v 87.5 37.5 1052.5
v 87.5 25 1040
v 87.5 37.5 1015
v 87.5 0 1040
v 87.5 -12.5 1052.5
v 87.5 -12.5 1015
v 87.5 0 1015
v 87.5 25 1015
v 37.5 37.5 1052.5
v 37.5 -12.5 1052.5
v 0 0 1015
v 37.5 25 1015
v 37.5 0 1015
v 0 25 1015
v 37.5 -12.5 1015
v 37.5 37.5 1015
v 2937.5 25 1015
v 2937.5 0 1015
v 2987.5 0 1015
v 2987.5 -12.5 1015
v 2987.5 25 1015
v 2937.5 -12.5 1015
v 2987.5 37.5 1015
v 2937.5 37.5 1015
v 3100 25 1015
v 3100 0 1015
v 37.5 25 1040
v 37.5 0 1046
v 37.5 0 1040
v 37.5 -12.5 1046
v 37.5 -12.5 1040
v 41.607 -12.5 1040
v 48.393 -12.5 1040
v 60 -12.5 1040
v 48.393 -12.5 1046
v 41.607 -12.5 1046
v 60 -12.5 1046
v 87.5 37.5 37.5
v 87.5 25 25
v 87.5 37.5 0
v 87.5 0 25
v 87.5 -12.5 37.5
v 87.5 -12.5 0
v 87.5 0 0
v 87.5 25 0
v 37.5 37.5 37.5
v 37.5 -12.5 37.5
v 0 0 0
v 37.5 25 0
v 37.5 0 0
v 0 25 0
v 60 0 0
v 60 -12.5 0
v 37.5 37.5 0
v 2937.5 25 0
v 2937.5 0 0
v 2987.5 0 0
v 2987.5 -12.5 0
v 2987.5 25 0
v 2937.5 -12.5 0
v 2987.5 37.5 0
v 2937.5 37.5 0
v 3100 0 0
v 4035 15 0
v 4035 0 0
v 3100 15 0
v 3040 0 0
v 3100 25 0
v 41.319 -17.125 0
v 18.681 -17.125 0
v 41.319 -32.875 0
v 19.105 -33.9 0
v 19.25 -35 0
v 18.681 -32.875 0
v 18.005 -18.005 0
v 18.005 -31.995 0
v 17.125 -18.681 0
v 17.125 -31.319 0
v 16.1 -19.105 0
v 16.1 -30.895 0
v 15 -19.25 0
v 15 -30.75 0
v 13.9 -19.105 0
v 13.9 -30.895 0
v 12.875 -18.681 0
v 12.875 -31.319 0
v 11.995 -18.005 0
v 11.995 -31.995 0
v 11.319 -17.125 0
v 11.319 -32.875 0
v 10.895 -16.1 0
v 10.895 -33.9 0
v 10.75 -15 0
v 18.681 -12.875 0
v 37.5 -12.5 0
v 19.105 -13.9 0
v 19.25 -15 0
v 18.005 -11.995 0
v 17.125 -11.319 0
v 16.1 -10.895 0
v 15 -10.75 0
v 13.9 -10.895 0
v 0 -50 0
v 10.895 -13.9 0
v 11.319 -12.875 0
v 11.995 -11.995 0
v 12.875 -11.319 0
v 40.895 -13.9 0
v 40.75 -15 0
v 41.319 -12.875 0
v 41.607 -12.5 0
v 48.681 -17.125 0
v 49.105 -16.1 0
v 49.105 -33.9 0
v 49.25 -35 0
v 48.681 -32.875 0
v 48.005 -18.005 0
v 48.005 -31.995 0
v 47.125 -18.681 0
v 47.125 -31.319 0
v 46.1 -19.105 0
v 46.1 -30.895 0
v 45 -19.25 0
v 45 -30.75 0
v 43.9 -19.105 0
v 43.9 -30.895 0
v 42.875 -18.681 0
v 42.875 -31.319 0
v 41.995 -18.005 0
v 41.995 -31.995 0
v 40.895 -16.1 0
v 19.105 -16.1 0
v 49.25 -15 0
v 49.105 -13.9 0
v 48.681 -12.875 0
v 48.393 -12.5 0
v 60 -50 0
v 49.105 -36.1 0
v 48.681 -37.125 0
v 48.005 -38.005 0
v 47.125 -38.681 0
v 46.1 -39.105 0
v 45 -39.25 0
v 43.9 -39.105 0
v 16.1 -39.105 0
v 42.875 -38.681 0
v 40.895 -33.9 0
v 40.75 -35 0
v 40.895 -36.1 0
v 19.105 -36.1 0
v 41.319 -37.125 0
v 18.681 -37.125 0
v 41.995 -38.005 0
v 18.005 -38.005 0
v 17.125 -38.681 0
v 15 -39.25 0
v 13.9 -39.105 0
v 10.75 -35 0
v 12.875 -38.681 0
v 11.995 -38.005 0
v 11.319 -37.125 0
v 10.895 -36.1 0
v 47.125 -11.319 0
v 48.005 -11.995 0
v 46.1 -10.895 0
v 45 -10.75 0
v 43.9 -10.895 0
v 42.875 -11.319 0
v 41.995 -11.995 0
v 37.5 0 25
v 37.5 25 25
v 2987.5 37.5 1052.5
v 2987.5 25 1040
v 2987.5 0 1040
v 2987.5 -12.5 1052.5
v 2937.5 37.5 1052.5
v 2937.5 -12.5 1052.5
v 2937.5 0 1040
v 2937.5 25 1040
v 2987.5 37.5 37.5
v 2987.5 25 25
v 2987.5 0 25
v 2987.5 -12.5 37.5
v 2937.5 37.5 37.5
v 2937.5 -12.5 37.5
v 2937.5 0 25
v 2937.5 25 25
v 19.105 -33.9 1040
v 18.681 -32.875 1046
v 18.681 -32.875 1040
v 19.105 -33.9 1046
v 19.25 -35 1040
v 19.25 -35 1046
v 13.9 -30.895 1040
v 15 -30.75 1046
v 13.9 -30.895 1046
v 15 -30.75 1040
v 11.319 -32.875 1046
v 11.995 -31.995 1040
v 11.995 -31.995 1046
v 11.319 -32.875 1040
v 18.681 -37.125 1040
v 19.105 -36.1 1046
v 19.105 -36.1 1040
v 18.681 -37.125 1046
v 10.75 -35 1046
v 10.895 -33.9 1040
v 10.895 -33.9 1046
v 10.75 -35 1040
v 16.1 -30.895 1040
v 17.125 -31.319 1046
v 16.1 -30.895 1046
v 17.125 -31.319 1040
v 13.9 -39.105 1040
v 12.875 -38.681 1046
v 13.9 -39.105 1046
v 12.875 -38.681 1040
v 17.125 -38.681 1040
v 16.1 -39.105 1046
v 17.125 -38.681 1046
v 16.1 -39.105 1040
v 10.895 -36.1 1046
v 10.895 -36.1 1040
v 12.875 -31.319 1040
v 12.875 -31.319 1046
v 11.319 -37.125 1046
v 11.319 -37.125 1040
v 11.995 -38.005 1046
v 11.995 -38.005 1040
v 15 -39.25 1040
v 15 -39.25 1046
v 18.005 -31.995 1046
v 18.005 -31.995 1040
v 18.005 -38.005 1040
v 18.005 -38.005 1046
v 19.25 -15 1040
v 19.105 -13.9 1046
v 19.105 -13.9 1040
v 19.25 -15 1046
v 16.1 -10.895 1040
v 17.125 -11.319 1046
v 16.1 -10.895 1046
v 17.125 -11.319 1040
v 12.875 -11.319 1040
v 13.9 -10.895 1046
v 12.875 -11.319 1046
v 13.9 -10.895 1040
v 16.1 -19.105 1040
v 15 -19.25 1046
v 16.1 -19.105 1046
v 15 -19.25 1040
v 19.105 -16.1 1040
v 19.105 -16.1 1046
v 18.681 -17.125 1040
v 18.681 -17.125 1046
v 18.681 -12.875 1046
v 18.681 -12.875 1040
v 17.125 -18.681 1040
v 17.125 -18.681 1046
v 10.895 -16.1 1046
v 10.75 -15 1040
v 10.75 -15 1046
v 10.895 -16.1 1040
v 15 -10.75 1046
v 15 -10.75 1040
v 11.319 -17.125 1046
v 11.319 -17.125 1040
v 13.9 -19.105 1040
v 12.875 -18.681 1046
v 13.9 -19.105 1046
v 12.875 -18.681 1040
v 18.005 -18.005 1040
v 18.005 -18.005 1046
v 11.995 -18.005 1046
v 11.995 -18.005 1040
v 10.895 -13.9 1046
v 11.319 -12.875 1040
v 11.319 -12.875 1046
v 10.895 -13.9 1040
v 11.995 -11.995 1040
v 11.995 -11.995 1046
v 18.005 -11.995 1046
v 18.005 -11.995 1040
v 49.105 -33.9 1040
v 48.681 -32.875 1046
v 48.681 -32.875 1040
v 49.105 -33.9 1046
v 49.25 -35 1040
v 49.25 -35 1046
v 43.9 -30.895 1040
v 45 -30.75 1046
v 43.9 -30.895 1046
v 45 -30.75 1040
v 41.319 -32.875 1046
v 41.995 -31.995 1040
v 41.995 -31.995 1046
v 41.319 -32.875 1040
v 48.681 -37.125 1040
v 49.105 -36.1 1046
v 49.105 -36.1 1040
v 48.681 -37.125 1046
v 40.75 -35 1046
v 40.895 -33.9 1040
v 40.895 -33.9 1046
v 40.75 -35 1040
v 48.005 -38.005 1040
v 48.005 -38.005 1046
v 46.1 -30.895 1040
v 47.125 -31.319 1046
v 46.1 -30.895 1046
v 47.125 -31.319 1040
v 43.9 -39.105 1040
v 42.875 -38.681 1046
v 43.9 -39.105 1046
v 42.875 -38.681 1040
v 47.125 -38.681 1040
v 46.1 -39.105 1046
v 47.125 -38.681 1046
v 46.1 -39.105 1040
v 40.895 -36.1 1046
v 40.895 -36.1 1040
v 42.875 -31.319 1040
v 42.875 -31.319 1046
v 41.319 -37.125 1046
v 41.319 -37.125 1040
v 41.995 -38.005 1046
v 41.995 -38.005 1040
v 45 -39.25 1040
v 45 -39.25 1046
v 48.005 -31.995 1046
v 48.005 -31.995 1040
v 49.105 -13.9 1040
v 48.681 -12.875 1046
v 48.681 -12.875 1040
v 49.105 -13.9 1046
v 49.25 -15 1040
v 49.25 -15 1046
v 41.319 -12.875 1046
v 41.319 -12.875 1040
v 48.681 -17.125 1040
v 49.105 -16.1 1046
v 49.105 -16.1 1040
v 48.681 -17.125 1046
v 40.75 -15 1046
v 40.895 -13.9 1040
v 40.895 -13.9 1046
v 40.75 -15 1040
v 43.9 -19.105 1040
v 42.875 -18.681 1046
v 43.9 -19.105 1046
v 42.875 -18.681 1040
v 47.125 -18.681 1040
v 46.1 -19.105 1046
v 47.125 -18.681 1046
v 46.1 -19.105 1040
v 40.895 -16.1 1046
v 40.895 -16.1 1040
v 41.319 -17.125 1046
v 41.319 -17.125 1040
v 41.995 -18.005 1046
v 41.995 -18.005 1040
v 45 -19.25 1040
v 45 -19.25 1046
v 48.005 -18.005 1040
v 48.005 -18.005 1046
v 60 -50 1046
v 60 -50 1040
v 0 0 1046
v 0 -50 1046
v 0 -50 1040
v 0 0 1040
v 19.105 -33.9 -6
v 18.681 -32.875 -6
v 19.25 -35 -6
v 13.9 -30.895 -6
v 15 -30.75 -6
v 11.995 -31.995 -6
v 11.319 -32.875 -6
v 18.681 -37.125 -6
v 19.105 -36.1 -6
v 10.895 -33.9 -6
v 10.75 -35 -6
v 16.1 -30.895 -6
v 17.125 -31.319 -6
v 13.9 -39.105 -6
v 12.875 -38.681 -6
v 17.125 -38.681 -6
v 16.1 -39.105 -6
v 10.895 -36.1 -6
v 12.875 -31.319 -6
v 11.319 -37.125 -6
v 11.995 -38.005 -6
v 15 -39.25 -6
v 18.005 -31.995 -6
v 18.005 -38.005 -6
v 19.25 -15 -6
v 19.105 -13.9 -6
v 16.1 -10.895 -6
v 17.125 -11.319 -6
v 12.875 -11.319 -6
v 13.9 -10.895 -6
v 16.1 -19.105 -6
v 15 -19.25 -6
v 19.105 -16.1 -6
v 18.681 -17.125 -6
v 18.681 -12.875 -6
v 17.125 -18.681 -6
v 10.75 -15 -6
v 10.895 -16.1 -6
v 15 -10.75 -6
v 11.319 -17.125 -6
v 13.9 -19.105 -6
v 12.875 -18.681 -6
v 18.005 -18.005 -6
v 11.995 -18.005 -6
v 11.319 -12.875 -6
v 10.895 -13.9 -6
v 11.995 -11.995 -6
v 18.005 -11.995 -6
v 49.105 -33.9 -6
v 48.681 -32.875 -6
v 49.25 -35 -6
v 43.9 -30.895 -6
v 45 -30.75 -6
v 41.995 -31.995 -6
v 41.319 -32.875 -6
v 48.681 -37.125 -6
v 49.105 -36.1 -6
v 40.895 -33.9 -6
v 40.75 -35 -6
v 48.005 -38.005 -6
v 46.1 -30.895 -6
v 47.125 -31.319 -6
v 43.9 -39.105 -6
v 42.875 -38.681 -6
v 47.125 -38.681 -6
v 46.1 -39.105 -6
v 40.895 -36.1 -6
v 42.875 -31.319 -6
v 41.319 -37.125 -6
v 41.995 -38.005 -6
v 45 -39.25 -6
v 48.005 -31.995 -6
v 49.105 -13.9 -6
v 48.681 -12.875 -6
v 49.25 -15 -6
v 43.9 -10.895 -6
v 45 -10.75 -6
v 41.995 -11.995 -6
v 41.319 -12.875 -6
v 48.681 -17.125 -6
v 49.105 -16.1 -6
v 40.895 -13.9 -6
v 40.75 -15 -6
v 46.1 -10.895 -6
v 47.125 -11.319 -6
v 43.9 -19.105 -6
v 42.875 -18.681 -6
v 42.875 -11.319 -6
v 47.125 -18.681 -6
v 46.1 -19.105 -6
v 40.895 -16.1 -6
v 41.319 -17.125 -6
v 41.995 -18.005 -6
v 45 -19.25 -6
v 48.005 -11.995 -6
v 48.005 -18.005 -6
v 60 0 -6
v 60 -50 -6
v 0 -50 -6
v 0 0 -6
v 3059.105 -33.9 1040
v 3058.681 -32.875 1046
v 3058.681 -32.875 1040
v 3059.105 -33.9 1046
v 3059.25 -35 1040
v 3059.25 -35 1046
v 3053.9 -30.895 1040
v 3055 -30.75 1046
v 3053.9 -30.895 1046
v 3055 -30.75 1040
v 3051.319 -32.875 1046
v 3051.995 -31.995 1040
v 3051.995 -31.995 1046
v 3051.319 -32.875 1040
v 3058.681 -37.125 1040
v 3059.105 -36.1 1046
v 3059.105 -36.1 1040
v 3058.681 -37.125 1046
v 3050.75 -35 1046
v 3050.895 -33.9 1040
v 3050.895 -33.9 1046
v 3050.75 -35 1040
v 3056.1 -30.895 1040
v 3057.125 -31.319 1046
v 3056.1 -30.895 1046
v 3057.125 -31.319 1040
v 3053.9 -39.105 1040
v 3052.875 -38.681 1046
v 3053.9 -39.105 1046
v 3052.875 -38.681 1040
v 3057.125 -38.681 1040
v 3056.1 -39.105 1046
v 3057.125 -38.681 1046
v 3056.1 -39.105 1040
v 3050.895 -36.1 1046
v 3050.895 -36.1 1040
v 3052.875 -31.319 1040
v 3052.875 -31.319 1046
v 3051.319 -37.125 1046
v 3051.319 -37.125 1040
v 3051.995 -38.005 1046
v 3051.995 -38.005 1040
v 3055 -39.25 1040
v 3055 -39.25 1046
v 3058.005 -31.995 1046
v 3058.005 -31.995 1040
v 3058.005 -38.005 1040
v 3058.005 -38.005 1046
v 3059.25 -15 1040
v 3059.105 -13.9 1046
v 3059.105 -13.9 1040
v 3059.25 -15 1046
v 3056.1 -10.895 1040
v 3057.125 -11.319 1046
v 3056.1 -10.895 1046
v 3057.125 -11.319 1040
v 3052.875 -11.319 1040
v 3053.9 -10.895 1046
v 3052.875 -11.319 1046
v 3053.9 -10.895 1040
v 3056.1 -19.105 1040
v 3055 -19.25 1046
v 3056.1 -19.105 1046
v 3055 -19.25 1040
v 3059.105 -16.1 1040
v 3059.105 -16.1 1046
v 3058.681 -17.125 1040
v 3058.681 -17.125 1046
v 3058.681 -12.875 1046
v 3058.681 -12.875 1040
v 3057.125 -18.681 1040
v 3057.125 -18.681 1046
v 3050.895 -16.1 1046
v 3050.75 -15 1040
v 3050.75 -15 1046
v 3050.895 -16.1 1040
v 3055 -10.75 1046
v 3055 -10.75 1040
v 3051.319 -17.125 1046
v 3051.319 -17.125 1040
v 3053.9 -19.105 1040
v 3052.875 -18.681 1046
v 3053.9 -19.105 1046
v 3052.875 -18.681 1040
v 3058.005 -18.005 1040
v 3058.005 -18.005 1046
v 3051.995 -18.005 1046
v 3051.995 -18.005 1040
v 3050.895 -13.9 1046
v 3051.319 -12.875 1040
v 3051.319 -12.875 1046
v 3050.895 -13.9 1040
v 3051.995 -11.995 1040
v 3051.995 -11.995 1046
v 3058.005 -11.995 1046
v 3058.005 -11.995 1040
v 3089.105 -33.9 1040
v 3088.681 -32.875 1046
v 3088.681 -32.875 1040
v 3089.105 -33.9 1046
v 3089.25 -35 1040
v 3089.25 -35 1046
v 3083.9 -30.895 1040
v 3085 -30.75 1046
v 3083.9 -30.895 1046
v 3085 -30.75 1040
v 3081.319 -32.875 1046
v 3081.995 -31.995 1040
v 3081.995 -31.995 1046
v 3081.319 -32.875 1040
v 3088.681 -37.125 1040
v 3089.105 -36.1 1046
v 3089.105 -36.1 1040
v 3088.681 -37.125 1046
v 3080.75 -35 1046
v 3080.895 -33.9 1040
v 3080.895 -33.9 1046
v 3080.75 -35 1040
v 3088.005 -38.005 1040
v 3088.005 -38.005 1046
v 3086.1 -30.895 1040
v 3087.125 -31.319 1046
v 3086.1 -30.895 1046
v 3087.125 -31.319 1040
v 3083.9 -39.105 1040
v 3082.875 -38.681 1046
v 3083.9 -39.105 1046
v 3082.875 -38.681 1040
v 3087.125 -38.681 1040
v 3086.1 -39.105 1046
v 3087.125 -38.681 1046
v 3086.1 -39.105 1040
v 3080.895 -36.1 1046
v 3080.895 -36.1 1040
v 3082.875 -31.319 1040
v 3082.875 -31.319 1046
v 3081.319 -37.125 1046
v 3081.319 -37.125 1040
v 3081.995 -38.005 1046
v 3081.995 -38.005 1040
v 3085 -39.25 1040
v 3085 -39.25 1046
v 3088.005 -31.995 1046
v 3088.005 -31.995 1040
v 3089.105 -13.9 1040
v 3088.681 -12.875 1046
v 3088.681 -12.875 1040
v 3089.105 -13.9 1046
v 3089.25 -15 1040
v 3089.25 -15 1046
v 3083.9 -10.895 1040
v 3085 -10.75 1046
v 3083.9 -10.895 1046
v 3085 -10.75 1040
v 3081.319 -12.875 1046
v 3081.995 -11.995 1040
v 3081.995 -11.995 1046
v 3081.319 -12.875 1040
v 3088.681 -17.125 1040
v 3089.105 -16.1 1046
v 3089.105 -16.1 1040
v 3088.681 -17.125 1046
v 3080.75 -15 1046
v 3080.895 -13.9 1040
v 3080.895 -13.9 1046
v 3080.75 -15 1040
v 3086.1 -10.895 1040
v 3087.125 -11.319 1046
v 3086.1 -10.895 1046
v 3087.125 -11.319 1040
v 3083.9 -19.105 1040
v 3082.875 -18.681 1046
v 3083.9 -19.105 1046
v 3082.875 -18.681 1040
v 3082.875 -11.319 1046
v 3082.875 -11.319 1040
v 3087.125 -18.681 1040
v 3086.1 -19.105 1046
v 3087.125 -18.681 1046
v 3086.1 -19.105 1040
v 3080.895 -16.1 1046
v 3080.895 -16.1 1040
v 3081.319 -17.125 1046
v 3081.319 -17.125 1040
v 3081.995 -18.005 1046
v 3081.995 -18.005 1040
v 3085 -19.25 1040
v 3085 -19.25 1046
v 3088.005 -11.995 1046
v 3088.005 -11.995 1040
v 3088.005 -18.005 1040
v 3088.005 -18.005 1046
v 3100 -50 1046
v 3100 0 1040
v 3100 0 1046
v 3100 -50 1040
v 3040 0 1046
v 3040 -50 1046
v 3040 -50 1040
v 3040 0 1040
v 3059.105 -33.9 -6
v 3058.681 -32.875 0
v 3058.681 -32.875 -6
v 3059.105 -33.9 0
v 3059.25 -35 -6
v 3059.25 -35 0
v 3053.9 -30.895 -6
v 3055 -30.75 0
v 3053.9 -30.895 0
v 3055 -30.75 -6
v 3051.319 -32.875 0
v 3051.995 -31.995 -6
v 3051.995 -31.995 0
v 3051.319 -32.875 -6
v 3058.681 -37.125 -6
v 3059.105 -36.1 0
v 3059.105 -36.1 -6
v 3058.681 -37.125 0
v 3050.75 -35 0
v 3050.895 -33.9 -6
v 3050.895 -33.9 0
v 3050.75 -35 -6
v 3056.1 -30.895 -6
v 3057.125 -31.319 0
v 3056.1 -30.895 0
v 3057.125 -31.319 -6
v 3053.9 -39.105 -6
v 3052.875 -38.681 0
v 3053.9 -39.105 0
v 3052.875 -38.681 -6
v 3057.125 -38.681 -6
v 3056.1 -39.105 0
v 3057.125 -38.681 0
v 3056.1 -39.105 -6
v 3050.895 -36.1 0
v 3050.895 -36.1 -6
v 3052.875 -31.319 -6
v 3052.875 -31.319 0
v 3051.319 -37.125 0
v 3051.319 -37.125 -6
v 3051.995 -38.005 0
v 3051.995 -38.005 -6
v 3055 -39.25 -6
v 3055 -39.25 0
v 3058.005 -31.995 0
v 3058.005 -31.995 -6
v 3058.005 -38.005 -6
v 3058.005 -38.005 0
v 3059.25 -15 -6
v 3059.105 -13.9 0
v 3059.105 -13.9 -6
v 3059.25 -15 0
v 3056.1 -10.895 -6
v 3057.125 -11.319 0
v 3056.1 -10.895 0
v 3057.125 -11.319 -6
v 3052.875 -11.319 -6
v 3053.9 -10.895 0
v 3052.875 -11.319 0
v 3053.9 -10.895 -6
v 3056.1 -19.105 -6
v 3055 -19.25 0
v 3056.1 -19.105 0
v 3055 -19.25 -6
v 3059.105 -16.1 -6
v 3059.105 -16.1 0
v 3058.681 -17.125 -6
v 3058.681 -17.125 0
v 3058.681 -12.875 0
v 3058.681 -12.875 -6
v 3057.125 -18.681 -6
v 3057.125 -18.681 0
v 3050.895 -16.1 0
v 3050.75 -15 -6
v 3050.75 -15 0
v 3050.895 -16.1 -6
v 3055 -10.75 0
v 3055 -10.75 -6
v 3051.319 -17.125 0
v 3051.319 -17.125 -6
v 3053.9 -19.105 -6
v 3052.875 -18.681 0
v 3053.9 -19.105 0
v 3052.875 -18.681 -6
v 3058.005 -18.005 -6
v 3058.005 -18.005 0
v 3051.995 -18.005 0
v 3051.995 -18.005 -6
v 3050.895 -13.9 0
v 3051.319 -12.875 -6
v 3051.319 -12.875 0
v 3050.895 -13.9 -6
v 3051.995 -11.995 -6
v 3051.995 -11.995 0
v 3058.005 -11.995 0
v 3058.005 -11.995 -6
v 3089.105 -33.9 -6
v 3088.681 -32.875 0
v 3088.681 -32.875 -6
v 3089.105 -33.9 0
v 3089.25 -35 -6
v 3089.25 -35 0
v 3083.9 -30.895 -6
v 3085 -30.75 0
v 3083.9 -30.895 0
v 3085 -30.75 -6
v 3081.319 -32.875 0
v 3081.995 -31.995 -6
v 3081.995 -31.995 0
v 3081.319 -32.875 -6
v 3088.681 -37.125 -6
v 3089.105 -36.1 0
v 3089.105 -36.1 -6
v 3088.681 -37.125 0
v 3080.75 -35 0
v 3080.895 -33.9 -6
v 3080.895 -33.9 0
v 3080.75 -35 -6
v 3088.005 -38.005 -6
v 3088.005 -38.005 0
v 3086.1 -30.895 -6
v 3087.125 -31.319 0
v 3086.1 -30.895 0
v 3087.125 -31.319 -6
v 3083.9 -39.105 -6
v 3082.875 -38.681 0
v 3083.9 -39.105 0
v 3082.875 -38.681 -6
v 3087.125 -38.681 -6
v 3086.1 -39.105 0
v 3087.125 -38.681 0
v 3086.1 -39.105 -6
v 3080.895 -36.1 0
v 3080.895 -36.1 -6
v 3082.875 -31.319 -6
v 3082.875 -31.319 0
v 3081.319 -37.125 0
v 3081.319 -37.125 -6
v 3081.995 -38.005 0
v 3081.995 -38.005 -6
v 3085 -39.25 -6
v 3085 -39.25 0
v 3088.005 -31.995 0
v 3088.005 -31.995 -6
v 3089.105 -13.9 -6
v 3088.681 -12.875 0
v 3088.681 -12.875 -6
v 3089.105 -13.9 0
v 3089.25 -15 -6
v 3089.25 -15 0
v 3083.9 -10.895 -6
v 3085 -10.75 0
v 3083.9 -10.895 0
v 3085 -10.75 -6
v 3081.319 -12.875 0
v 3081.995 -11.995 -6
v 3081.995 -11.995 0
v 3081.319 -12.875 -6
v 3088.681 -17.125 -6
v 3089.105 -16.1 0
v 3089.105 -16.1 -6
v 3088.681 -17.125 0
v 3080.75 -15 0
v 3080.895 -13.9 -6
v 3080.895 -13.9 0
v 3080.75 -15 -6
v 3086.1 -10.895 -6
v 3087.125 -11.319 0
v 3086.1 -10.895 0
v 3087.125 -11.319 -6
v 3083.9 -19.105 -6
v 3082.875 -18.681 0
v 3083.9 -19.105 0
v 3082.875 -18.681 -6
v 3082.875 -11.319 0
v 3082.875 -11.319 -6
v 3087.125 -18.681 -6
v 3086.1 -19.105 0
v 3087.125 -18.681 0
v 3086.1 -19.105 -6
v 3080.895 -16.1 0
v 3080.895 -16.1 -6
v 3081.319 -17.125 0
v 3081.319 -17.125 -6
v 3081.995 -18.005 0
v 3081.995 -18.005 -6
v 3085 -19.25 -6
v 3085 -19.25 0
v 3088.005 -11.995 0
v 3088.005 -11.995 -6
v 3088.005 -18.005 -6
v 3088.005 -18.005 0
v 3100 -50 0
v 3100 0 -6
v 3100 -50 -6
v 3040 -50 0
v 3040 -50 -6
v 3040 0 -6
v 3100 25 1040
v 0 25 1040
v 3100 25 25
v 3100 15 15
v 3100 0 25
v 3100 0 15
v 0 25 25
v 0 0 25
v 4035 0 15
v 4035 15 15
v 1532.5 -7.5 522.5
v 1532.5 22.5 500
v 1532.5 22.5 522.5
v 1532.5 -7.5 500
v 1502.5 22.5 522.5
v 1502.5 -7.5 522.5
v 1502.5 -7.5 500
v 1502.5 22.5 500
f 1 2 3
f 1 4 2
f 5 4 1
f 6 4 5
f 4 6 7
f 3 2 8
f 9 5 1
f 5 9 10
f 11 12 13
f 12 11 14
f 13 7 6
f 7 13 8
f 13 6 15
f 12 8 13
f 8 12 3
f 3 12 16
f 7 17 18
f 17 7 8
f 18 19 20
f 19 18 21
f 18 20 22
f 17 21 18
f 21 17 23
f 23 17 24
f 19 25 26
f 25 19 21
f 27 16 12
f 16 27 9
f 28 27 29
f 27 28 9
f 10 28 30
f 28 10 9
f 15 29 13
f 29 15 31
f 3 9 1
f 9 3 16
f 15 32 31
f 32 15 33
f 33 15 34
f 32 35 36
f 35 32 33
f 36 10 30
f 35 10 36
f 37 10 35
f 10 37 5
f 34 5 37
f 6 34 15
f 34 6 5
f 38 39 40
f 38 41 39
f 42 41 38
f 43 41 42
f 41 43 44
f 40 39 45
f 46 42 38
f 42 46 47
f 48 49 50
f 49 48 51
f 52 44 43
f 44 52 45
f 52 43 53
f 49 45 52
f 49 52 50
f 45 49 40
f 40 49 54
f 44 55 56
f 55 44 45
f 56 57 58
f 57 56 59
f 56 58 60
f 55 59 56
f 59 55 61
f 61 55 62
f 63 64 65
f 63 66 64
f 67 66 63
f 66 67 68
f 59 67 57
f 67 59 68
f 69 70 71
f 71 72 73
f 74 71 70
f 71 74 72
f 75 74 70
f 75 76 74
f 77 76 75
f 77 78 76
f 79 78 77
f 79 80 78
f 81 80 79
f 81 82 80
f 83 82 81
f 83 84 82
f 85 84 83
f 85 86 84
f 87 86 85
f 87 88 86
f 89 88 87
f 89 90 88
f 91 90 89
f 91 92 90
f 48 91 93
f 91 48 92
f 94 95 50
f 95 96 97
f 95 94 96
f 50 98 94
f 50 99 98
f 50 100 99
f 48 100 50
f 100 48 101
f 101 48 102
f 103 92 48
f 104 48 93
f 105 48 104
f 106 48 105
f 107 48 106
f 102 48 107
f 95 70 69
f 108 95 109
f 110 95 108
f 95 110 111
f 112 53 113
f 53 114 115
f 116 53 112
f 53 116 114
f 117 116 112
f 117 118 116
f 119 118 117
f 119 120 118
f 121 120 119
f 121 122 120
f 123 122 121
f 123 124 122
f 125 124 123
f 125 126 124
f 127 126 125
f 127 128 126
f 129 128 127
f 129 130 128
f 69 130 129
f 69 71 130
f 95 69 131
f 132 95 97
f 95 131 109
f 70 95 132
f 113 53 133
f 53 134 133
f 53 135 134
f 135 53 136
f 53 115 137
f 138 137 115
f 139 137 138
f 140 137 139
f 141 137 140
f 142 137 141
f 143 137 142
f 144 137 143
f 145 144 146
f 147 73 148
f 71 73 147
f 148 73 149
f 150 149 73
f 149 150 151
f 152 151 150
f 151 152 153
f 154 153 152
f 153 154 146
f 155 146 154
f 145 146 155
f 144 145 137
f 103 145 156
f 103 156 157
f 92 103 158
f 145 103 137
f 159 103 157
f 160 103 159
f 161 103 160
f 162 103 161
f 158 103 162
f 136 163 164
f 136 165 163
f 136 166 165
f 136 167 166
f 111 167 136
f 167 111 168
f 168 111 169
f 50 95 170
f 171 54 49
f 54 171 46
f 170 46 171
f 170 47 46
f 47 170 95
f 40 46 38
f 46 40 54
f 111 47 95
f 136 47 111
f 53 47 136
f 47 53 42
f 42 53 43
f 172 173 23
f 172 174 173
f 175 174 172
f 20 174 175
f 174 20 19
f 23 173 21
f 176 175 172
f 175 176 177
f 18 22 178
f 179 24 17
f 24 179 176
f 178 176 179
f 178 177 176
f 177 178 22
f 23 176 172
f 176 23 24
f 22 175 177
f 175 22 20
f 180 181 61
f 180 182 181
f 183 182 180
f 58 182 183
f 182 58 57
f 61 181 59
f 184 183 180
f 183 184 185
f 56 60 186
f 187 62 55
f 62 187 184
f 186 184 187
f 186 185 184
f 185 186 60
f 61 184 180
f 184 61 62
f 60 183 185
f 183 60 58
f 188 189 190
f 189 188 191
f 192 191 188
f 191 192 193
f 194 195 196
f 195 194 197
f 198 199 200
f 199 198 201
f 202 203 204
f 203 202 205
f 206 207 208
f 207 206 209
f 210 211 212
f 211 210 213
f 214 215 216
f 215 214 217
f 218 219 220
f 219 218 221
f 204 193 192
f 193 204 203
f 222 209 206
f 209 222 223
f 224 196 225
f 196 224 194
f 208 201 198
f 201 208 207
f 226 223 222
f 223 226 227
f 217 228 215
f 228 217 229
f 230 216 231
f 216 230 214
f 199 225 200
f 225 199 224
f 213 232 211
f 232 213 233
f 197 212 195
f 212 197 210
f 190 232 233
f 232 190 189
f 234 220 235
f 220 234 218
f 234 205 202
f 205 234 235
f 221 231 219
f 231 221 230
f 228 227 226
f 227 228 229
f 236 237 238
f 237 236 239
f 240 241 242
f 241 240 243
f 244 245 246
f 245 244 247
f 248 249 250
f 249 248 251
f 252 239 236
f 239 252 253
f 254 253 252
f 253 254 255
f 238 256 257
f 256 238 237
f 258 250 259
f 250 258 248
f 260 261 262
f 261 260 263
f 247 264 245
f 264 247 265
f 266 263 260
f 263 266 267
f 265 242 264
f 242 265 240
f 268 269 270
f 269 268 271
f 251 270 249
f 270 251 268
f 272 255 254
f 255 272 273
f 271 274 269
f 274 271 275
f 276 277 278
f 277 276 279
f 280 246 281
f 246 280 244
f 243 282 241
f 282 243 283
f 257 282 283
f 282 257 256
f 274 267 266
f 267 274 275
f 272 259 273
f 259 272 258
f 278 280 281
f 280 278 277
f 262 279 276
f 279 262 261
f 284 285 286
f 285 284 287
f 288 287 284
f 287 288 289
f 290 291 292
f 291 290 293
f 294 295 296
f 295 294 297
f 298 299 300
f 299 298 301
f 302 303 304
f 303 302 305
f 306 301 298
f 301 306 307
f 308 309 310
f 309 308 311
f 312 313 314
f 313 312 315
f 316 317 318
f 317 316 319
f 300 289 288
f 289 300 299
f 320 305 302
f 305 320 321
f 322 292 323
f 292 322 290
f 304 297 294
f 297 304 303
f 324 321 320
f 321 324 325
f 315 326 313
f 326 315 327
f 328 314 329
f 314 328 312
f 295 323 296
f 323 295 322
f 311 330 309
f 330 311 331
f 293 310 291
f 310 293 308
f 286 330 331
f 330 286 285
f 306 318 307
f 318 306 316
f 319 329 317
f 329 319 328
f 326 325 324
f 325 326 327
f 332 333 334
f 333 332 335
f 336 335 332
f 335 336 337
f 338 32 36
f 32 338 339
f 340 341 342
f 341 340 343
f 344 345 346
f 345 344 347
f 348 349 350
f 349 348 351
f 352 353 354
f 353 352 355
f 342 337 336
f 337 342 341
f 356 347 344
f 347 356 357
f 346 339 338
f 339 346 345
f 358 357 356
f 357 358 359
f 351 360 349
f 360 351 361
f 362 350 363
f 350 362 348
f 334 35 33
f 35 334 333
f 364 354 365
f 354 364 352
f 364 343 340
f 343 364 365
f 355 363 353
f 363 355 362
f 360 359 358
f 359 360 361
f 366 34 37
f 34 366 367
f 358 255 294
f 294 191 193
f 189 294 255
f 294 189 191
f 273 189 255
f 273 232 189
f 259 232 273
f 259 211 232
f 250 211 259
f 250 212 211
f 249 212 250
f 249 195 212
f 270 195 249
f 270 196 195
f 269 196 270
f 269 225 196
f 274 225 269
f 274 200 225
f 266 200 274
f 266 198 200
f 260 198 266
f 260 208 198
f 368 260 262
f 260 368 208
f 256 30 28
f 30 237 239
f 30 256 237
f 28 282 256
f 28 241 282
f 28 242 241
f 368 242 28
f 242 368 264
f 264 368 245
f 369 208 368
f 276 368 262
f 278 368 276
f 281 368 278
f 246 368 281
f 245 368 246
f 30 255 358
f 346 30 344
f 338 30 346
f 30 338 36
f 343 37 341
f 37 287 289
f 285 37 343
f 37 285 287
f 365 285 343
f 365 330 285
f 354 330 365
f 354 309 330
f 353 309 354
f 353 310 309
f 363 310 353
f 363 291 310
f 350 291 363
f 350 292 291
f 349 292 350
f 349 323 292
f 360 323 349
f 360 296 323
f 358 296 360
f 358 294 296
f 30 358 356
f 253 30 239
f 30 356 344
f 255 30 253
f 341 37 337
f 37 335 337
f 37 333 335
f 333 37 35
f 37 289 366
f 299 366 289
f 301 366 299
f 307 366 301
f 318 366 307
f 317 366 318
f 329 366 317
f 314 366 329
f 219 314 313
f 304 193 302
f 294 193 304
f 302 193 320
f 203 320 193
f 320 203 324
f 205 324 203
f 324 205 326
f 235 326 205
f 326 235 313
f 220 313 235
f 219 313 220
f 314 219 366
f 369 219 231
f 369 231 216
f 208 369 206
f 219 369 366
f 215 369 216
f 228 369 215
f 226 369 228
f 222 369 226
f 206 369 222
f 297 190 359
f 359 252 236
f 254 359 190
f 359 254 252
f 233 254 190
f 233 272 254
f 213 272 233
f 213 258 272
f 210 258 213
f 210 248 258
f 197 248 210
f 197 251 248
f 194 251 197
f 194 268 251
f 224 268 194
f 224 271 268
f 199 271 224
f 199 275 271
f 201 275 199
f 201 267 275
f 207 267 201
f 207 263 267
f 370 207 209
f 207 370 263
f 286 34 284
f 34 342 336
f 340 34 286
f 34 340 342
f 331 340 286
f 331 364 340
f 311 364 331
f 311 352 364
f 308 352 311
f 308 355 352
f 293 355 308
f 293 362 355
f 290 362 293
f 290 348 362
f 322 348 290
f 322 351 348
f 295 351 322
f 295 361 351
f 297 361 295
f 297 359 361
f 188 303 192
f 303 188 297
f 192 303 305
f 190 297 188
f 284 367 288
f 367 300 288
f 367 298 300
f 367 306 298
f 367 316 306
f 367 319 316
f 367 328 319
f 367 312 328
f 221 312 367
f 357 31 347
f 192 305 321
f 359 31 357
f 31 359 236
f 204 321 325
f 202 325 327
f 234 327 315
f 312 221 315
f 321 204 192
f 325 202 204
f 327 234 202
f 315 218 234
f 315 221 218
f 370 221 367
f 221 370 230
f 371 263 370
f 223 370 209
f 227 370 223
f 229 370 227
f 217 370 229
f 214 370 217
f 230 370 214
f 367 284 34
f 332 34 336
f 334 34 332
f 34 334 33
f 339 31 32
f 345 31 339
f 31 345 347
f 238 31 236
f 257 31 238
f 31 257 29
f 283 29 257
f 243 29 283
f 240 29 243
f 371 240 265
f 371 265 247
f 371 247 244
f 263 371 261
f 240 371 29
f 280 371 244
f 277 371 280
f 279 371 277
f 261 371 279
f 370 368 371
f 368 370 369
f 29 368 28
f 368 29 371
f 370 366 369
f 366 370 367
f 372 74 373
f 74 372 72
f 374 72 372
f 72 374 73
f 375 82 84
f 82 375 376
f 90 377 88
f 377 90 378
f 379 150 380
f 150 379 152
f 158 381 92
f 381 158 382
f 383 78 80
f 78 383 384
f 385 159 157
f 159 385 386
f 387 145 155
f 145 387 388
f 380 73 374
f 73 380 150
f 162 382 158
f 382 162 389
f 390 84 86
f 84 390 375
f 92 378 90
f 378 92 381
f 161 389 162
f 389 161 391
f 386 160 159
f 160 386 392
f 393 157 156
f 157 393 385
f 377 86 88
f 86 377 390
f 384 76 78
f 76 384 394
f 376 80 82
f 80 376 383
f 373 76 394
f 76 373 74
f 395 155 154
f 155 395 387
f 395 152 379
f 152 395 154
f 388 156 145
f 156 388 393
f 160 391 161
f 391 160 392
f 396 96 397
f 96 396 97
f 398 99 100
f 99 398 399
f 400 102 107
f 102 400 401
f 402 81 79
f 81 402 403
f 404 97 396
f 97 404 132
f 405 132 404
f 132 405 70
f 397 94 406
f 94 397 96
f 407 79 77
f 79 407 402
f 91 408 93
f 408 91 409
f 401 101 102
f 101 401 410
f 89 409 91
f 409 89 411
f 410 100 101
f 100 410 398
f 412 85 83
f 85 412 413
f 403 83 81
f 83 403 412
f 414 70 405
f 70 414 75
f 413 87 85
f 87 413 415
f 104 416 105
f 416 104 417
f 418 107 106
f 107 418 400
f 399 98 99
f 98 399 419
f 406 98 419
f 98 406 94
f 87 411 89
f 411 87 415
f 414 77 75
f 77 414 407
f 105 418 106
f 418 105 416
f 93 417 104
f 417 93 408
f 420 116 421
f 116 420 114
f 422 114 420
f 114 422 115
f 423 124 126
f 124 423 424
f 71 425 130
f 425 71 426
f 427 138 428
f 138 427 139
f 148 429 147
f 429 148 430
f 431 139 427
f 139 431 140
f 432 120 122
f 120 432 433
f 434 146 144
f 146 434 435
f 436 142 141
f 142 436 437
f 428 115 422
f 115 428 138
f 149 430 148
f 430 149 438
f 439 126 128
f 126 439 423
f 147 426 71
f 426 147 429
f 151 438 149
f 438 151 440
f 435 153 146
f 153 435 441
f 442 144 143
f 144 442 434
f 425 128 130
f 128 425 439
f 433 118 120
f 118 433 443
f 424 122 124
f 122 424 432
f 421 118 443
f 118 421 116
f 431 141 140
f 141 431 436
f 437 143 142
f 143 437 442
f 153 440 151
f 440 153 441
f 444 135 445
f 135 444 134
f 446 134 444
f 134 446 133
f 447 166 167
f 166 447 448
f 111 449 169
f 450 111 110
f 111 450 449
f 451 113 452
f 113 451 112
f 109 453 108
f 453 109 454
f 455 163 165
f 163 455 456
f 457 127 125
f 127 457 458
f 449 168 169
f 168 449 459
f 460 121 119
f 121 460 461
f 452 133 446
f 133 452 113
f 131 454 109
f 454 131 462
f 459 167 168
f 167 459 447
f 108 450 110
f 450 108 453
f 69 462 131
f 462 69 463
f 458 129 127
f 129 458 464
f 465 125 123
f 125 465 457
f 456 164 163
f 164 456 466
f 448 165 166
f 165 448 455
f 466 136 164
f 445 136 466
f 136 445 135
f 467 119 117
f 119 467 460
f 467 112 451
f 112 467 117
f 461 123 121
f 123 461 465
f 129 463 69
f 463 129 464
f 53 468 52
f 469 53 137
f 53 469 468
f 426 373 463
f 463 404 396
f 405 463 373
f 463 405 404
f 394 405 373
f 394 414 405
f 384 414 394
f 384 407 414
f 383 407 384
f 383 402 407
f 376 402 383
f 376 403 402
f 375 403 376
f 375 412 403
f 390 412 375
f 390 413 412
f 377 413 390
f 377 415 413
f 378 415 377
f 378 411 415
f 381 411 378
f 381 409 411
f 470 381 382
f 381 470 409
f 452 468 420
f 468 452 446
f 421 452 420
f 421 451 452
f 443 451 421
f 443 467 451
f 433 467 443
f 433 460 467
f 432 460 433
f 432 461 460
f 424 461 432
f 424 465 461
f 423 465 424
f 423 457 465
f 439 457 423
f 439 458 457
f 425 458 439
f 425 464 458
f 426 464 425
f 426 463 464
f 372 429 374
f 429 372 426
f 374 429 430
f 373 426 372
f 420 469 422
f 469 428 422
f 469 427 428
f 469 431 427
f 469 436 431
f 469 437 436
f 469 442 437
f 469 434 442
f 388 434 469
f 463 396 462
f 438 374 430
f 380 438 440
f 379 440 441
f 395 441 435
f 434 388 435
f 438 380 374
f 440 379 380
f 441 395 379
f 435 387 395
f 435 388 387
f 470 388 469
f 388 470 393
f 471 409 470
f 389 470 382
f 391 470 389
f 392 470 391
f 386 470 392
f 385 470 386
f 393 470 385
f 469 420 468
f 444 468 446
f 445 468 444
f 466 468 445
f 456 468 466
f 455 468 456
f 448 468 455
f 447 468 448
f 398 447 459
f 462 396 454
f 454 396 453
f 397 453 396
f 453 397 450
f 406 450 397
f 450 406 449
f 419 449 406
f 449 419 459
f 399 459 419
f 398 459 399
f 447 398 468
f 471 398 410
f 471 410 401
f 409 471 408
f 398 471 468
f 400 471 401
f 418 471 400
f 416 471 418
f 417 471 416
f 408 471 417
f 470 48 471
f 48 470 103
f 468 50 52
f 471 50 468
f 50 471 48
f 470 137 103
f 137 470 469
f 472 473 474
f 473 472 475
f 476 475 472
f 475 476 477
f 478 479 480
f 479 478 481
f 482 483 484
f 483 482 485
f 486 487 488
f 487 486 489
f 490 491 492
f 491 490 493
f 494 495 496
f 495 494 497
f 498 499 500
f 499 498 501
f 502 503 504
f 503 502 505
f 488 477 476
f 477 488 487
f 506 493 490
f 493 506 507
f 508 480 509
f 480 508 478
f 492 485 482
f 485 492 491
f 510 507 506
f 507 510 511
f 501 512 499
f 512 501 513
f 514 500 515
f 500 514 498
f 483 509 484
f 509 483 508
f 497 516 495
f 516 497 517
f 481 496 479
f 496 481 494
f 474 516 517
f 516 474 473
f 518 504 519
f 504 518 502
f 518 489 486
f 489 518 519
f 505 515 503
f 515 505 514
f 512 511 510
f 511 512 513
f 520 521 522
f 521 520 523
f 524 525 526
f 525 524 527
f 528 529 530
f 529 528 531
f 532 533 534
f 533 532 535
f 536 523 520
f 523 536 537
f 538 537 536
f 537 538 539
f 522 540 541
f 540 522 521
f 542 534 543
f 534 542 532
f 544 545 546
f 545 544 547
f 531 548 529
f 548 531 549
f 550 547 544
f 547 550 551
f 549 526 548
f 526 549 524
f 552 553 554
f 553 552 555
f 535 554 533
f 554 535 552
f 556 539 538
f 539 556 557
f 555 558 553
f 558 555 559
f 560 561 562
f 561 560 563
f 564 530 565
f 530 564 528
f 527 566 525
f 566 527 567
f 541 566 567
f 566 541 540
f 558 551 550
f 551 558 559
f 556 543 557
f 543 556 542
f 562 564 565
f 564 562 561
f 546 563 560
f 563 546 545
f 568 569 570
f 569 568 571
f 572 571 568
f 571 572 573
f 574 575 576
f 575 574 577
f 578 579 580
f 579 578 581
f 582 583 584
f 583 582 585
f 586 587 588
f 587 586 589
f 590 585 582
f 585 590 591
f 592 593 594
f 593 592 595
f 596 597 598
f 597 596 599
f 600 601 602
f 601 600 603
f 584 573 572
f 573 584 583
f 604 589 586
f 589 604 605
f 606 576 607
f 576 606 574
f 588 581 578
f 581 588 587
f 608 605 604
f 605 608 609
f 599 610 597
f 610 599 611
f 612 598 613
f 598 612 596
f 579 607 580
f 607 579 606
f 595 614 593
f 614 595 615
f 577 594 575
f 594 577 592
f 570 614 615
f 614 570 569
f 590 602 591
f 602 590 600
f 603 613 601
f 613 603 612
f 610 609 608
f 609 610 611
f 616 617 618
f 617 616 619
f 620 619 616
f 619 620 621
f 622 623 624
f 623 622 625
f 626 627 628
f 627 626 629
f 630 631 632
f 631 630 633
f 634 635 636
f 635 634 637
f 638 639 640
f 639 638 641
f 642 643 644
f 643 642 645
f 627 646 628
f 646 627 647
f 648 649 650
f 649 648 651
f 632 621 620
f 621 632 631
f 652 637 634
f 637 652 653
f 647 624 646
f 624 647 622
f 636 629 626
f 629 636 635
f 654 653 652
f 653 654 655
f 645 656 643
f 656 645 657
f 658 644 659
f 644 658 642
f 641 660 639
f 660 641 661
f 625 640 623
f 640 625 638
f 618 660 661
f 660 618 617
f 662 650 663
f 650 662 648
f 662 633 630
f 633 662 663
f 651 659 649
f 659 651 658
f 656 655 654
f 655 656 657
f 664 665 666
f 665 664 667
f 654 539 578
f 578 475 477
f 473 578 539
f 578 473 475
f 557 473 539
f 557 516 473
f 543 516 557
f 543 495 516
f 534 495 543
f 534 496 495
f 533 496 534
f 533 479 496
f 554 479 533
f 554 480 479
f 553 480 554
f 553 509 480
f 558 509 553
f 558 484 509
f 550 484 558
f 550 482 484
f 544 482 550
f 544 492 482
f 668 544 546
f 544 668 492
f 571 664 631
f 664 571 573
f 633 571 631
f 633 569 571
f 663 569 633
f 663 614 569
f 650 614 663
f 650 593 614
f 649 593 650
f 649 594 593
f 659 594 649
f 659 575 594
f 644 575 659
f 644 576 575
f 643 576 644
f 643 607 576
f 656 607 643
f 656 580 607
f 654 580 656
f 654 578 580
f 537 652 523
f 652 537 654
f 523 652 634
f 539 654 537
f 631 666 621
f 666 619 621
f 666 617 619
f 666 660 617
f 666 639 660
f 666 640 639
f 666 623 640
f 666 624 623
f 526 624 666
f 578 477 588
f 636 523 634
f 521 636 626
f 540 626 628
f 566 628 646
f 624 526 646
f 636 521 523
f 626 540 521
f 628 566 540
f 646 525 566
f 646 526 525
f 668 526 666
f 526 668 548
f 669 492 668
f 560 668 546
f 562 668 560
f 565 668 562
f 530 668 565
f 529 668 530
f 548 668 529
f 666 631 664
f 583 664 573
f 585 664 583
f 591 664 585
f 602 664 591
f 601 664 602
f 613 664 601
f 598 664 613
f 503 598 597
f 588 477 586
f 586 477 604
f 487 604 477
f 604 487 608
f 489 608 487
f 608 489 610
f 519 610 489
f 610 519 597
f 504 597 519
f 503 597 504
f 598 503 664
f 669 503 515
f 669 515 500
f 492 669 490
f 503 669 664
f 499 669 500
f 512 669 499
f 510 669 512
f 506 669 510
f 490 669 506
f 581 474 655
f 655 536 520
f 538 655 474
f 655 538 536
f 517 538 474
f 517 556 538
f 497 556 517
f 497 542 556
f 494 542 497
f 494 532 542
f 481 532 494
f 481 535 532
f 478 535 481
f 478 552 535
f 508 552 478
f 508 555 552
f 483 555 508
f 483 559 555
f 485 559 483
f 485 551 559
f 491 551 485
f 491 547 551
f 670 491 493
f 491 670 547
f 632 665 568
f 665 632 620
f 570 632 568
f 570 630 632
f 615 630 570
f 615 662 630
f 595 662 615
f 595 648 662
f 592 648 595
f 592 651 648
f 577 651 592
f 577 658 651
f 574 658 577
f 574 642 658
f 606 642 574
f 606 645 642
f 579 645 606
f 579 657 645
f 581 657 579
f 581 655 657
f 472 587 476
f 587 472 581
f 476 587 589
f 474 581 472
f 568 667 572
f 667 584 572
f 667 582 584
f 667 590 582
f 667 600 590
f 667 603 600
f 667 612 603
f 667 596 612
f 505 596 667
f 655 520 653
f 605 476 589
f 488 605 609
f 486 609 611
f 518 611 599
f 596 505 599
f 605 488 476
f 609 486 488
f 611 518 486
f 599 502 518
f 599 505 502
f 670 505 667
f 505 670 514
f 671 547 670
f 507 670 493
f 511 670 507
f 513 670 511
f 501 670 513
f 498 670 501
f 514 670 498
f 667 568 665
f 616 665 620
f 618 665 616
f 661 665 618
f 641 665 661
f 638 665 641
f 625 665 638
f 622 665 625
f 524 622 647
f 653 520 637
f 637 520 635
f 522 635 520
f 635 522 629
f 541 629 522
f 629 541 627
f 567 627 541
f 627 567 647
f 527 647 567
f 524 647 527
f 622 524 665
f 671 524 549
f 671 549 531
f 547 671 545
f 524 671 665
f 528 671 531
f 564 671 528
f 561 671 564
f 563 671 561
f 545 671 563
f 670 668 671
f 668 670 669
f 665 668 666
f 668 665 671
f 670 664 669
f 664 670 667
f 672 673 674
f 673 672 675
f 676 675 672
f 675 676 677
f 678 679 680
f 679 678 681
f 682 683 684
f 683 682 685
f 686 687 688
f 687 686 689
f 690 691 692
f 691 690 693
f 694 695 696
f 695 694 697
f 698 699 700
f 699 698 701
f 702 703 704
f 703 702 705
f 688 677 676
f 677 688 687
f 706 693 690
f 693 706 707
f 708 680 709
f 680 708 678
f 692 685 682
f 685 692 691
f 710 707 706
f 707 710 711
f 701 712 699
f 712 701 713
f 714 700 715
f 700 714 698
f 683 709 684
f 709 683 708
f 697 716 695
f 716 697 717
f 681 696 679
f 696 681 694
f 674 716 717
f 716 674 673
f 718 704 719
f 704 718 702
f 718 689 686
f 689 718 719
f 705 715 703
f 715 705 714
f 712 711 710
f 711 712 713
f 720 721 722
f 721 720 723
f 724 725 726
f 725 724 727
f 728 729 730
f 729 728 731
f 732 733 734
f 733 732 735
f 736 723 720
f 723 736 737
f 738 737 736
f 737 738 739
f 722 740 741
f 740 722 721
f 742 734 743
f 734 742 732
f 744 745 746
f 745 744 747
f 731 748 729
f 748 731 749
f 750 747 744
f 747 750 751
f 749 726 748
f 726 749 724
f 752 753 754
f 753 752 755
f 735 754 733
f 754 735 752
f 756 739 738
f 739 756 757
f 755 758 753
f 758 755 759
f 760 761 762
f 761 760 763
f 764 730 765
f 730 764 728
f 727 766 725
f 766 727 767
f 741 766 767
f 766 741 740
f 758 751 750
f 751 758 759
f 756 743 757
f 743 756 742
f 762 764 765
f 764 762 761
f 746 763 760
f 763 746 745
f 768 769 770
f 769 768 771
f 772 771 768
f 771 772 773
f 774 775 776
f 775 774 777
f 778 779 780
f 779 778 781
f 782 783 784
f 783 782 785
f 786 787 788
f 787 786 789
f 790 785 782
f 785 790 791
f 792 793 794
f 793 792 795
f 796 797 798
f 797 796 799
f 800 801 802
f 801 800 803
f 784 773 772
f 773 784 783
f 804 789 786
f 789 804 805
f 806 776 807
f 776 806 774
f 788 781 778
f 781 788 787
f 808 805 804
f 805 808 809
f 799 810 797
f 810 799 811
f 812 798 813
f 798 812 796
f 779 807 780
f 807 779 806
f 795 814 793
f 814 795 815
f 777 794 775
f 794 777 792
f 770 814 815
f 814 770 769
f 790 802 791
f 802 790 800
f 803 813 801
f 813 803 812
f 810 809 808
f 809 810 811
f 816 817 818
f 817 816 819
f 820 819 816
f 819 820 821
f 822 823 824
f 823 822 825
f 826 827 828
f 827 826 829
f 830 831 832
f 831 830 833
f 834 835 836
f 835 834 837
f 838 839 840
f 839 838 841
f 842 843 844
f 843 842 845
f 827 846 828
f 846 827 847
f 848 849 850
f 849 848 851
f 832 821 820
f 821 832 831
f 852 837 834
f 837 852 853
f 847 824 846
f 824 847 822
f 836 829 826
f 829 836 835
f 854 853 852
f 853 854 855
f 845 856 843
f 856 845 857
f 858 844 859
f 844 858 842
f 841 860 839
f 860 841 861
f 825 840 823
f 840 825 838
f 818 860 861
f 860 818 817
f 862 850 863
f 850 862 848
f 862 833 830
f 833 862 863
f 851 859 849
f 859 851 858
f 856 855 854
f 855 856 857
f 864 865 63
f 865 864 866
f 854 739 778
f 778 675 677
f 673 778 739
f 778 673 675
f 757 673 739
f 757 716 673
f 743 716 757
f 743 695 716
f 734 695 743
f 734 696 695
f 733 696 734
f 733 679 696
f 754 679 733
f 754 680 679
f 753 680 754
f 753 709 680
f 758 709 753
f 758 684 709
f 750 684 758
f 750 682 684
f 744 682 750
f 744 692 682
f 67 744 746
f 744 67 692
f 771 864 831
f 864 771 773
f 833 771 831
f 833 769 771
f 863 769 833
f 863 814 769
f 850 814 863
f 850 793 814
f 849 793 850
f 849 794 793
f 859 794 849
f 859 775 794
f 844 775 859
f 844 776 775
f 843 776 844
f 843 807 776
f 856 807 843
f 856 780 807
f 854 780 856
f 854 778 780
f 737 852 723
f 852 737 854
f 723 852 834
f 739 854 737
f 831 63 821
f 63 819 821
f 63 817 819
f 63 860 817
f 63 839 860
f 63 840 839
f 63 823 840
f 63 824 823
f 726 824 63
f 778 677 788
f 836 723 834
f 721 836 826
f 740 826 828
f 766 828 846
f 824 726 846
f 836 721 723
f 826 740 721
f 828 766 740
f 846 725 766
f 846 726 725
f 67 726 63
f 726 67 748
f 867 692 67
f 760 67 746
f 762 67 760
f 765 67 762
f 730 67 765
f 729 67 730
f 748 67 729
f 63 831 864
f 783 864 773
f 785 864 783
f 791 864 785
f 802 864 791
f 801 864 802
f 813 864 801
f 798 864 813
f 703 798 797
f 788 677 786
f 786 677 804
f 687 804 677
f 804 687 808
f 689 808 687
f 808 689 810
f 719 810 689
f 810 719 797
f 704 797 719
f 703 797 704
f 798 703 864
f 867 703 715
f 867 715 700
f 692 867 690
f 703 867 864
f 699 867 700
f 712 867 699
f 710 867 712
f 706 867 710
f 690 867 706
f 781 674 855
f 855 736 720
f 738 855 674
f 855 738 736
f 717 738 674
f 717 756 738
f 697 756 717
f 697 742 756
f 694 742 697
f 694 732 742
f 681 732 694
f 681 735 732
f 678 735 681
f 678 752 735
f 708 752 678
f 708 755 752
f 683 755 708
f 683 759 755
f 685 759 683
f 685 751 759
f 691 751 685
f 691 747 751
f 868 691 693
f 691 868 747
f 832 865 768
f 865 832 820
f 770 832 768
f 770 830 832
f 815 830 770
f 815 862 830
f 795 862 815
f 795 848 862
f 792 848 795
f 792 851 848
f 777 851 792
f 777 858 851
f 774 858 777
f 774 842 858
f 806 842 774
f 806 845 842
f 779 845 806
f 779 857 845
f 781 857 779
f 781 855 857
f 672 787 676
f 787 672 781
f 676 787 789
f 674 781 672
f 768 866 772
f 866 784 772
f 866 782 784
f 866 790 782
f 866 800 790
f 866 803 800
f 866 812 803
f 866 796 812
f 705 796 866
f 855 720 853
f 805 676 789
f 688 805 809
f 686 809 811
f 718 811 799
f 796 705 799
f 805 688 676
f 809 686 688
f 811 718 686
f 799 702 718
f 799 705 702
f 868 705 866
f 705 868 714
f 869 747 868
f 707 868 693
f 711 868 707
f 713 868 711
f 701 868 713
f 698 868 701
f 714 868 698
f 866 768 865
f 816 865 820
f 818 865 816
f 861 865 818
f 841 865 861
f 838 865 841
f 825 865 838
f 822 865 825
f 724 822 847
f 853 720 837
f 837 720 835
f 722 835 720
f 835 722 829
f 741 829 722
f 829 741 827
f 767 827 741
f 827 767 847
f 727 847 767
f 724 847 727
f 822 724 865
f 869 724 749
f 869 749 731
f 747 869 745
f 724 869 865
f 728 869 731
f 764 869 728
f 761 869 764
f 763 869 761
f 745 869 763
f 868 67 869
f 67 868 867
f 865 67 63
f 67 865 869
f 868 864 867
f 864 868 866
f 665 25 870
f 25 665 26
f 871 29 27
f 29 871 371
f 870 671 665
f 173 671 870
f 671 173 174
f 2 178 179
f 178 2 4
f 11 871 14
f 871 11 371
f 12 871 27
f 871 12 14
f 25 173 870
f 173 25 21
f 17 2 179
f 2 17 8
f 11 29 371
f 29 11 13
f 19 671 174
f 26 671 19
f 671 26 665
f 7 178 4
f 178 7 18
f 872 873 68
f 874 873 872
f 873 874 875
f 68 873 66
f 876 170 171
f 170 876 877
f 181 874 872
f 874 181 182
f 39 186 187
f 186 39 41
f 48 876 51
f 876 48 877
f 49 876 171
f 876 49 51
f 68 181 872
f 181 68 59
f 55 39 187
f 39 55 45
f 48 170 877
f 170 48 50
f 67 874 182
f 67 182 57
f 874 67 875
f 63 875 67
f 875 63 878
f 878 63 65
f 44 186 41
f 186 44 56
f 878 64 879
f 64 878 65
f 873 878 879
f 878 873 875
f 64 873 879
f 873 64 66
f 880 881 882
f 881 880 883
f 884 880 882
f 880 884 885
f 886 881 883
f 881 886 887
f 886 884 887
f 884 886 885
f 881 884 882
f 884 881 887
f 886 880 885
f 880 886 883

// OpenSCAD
// AquaKeeper — Rail Frame Assembly (OpenSCAD)
// Parametric 3D model for the 2-axis gantry frame
// that mounts onto a standard water polo goal.
//
// Units: millimeters
// To render: Open in OpenSCAD and press F6

// =============================================================
// Parameters
// =============================================================

// Goal dimensions
goal_width       = 3000;   // mm
goal_height      = 900;    // mm

// Rail profile
h_rail_profile   = 25;     // mm (HGR25)
v_rail_profile   = 15;     // mm (HGR15)

// Rail lengths (stroke + overtravel)
h_rail_length    = 3100;   // mm
v_rail_length    = 1000;   // mm

// Mounting bracket dimensions
bracket_width    = 60;     // mm
bracket_depth    = 50;     // mm
bracket_thickness = 6;     // mm

// Carriage plate
carriage_plate_w = 80;     // mm
carriage_plate_h = 80;     // mm
carriage_plate_t = 10;     // mm

// =============================================================
// Modules
// =============================================================

module rail(length, profile) {
    // Simplified linear rail: rectangular cross-section
    color("Silver")
    cube([length, profile, profile], center=false);
}

module carriage(profile) {
    // Simplified carriage block
    size = profile * 2;
    color("DimGray")
    translate([-size/4, -profile/2, 0])
    cube([size, profile * 2, profile * 1.5]);
}

module mounting_bracket() {
    color("Silver")
    difference() {
        cube([bracket_width, bracket_depth, bracket_thickness]);
        // Mounting holes
        for (dx = [15, bracket_width - 15]) {
            for (dy = [15, bracket_depth - 15]) {
                translate([dx, dy, -1])
                cylinder(h=bracket_thickness + 2, d=8.5, $fn=24);
            }
        }
    }
}

module carriage_plate() {
    color("LightGray")
    difference() {
        cube([carriage_plate_w, carriage_plate_h, carriage_plate_t]);
        // Mounting holes
        for (dx = [10, carriage_plate_w - 10]) {
            for (dy = [10, carriage_plate_h - 10]) {
                translate([dx, dy, -1])
                cylinder(h=carriage_plate_t + 2, d=6.5, $fn=24);
            }
        }
    }
}

// =============================================================
// Assembly
// =============================================================

module frame_assembly() {
    // Top horizontal rail
    translate([0, 0, v_rail_length + v_rail_profile])
    rail(h_rail_length, h_rail_profile);

    // Bottom horizontal rail
    translate([0, 0, 0])
    rail(h_rail_length, h_rail_profile);

    // Left vertical rail
    translate([50, 0, 0])
    rotate([0, 0, 0])
    rail(v_rail_length, v_rail_profile);

    // Right vertical rail
    translate([h_rail_length - 50 - v_rail_profile, 0, 0])
    rail(v_rail_length, v_rail_profile);

    // Horizontal carriages (4 total — 2 per rail)
    for (x = [50, h_rail_length - 150]) {
        translate([x, 0, v_rail_length + v_rail_profile])
        carriage(h_rail_profile);

        translate([x, 0, 0])
        carriage(h_rail_profile);
    }

    // Vertical carriage (paddle mount)
    translate([h_rail_length/2 - carriage_plate_w/2, 0, v_rail_length/2])
    carriage(v_rail_profile);

    // Mounting brackets (4 corners)
    for (x = [0, h_rail_length - bracket_width]) {
        translate([x, -bracket_depth, v_rail_length + v_rail_profile + h_rail_profile])
        mounting_bracket();

        translate([x, -bracket_depth, -bracket_thickness])
        mounting_bracket();
    }
}

// Render the assembly
frame_assembly();

echo("Frame assembly rendered.");
echo(str("Goal width: ", goal_width, " mm"));
echo(str("Goal height: ", goal_height, " mm"));
echo(str("H-rail length: ", h_rail_length, " mm"));
echo(str("V-rail length: ", v_rail_length, " mm"));
